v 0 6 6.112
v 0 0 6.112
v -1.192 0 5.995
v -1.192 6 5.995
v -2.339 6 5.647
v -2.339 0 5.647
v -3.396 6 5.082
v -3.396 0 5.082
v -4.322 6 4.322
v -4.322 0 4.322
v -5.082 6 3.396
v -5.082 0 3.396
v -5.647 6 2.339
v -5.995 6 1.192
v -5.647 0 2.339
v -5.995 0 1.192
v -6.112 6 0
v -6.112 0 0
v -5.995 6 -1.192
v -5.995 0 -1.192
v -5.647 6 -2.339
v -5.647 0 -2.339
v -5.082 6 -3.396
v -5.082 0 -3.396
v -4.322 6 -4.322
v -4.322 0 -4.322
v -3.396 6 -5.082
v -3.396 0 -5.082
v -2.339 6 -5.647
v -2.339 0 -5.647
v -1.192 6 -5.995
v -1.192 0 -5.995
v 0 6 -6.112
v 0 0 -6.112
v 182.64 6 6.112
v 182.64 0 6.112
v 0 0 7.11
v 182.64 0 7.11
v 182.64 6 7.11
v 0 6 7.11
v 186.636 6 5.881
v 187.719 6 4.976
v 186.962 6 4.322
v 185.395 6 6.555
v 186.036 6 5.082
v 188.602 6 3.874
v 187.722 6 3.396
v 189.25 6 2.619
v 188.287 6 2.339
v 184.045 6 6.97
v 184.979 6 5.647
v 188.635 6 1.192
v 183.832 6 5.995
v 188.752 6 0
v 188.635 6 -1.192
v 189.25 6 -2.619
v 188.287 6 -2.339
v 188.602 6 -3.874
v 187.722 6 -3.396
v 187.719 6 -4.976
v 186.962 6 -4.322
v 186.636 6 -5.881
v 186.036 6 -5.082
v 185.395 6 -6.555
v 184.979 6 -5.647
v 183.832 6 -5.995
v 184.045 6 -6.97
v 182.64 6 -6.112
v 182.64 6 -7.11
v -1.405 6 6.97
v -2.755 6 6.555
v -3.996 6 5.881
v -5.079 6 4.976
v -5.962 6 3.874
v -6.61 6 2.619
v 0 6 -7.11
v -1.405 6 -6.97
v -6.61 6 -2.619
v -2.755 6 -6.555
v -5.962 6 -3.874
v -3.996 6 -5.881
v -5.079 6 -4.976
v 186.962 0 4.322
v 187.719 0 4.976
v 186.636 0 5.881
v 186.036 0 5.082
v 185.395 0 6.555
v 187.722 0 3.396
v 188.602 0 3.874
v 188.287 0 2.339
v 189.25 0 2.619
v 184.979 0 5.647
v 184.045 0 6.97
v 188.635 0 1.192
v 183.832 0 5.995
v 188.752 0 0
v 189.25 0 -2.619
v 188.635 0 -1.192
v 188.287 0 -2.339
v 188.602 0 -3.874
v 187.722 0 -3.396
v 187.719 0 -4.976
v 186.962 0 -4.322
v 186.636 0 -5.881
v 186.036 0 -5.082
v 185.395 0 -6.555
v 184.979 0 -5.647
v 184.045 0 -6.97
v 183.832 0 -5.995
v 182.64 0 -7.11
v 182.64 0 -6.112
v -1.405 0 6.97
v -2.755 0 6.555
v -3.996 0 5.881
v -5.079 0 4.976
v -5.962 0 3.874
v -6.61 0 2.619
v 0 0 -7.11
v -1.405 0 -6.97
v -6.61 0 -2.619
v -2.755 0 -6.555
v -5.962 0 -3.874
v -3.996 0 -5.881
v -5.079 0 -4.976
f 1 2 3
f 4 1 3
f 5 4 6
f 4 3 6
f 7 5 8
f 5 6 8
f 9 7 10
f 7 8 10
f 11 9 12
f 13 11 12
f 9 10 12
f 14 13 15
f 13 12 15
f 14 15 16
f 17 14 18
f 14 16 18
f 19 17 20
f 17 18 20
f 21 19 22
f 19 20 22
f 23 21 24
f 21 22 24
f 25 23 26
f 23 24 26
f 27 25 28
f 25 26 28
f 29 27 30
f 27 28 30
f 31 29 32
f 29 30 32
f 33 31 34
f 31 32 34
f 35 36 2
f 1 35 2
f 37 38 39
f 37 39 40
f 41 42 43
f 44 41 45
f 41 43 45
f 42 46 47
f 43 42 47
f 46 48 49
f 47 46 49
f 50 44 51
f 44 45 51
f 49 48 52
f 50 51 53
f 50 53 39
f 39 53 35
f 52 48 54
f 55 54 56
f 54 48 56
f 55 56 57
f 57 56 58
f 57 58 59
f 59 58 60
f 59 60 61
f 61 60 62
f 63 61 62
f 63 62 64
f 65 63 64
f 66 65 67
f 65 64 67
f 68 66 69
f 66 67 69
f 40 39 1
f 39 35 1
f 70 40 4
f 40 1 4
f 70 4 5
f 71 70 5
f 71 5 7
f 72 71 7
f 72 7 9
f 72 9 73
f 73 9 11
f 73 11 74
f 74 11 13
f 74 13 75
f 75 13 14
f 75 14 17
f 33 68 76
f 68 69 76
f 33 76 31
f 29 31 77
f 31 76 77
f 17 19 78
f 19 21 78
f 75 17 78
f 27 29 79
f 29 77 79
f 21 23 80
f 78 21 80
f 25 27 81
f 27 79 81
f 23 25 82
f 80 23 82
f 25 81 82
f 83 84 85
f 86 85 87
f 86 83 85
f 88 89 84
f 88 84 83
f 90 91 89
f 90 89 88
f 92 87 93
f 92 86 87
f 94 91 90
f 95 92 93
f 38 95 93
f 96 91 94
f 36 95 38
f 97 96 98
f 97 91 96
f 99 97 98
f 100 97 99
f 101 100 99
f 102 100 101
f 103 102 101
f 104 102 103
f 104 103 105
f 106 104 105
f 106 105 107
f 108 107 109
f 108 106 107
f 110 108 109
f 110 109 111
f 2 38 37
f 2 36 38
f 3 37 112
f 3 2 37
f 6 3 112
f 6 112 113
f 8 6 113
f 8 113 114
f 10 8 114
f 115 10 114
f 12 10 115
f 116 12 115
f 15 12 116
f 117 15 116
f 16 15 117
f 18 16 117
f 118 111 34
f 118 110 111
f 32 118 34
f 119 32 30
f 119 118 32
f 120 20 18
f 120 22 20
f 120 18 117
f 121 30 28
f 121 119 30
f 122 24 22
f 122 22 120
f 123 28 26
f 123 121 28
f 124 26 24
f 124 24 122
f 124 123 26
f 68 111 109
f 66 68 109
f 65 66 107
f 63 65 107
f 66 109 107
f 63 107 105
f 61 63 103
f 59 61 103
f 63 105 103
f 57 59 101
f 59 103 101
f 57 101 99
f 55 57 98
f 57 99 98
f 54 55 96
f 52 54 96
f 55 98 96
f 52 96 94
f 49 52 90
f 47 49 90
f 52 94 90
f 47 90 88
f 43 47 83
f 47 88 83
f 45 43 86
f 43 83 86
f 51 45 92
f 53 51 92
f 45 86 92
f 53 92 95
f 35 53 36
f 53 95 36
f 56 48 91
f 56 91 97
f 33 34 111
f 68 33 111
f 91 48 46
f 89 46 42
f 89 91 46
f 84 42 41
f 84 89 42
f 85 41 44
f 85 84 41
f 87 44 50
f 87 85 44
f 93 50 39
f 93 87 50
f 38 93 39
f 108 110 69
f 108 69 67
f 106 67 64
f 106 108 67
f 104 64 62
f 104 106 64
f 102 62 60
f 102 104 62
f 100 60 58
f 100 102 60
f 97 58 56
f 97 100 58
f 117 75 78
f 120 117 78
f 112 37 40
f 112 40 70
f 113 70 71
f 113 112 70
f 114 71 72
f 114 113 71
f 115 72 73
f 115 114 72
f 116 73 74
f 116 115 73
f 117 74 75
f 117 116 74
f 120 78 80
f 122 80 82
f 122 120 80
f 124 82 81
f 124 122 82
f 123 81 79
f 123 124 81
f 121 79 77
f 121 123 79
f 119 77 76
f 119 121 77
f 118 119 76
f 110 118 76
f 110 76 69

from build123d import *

# Parameters (mm, degrees)
BOSS_EXTRUDE1_DEPTH = 6
SKETCH2_W           = 1
SKETCH2_H           = 15
CUT_EXTRUDE1_DEPTH  = 190.977931876


with BuildPart() as part:
    # Sketch1 → Boss-Extrude1 (new body)
    with BuildSketch(Plane(origin=(0, 0, 0), x_dir=(1, 0, 0), z_dir=(0, 1, 0))):
        with BuildLine():
            Line((0, 7.11), (182.64, 7.11))
            ThreePointArc((182.64, 7.11), (189.75, 0), (182.64, -7.11))
            Line((182.64, -7.11), (0, -7.11))
            ThreePointArc((0, -7.11), (-7.11, 0), (0, 7.11))
        make_face()
        with BuildLine():
            Line((0, 6.112197724), (182.64, 6.112197724))
            ThreePointArc((182.64, 6.112197724), (188.752197724, 0), (182.64, -6.112197724))
            Line((182.64, -6.112197724), (0, -6.112197724))
            ThreePointArc((0, -6.112197724), (-6.112197724, 0), (0, 6.112197724))
        make_face(mode=Mode.SUBTRACT)
    extrude(amount=BOSS_EXTRUDE1_DEPTH)

    # Sketch2 → Cut-Extrude1 (cut, through all)
    with BuildSketch(Plane(origin=(0, 6, 0), x_dir=(1, 0, 0), z_dir=(0, 1, 0))):
        with Locations((189.75, 0)):
            Rectangle(SKETCH2_W, SKETCH2_H)
        with Locations((-7.11, 0)):
            Rectangle(SKETCH2_W, SKETCH2_H)
    extrude(amount=-CUT_EXTRUDE1_DEPTH, mode=Mode.SUBTRACT)


solid = part.part
